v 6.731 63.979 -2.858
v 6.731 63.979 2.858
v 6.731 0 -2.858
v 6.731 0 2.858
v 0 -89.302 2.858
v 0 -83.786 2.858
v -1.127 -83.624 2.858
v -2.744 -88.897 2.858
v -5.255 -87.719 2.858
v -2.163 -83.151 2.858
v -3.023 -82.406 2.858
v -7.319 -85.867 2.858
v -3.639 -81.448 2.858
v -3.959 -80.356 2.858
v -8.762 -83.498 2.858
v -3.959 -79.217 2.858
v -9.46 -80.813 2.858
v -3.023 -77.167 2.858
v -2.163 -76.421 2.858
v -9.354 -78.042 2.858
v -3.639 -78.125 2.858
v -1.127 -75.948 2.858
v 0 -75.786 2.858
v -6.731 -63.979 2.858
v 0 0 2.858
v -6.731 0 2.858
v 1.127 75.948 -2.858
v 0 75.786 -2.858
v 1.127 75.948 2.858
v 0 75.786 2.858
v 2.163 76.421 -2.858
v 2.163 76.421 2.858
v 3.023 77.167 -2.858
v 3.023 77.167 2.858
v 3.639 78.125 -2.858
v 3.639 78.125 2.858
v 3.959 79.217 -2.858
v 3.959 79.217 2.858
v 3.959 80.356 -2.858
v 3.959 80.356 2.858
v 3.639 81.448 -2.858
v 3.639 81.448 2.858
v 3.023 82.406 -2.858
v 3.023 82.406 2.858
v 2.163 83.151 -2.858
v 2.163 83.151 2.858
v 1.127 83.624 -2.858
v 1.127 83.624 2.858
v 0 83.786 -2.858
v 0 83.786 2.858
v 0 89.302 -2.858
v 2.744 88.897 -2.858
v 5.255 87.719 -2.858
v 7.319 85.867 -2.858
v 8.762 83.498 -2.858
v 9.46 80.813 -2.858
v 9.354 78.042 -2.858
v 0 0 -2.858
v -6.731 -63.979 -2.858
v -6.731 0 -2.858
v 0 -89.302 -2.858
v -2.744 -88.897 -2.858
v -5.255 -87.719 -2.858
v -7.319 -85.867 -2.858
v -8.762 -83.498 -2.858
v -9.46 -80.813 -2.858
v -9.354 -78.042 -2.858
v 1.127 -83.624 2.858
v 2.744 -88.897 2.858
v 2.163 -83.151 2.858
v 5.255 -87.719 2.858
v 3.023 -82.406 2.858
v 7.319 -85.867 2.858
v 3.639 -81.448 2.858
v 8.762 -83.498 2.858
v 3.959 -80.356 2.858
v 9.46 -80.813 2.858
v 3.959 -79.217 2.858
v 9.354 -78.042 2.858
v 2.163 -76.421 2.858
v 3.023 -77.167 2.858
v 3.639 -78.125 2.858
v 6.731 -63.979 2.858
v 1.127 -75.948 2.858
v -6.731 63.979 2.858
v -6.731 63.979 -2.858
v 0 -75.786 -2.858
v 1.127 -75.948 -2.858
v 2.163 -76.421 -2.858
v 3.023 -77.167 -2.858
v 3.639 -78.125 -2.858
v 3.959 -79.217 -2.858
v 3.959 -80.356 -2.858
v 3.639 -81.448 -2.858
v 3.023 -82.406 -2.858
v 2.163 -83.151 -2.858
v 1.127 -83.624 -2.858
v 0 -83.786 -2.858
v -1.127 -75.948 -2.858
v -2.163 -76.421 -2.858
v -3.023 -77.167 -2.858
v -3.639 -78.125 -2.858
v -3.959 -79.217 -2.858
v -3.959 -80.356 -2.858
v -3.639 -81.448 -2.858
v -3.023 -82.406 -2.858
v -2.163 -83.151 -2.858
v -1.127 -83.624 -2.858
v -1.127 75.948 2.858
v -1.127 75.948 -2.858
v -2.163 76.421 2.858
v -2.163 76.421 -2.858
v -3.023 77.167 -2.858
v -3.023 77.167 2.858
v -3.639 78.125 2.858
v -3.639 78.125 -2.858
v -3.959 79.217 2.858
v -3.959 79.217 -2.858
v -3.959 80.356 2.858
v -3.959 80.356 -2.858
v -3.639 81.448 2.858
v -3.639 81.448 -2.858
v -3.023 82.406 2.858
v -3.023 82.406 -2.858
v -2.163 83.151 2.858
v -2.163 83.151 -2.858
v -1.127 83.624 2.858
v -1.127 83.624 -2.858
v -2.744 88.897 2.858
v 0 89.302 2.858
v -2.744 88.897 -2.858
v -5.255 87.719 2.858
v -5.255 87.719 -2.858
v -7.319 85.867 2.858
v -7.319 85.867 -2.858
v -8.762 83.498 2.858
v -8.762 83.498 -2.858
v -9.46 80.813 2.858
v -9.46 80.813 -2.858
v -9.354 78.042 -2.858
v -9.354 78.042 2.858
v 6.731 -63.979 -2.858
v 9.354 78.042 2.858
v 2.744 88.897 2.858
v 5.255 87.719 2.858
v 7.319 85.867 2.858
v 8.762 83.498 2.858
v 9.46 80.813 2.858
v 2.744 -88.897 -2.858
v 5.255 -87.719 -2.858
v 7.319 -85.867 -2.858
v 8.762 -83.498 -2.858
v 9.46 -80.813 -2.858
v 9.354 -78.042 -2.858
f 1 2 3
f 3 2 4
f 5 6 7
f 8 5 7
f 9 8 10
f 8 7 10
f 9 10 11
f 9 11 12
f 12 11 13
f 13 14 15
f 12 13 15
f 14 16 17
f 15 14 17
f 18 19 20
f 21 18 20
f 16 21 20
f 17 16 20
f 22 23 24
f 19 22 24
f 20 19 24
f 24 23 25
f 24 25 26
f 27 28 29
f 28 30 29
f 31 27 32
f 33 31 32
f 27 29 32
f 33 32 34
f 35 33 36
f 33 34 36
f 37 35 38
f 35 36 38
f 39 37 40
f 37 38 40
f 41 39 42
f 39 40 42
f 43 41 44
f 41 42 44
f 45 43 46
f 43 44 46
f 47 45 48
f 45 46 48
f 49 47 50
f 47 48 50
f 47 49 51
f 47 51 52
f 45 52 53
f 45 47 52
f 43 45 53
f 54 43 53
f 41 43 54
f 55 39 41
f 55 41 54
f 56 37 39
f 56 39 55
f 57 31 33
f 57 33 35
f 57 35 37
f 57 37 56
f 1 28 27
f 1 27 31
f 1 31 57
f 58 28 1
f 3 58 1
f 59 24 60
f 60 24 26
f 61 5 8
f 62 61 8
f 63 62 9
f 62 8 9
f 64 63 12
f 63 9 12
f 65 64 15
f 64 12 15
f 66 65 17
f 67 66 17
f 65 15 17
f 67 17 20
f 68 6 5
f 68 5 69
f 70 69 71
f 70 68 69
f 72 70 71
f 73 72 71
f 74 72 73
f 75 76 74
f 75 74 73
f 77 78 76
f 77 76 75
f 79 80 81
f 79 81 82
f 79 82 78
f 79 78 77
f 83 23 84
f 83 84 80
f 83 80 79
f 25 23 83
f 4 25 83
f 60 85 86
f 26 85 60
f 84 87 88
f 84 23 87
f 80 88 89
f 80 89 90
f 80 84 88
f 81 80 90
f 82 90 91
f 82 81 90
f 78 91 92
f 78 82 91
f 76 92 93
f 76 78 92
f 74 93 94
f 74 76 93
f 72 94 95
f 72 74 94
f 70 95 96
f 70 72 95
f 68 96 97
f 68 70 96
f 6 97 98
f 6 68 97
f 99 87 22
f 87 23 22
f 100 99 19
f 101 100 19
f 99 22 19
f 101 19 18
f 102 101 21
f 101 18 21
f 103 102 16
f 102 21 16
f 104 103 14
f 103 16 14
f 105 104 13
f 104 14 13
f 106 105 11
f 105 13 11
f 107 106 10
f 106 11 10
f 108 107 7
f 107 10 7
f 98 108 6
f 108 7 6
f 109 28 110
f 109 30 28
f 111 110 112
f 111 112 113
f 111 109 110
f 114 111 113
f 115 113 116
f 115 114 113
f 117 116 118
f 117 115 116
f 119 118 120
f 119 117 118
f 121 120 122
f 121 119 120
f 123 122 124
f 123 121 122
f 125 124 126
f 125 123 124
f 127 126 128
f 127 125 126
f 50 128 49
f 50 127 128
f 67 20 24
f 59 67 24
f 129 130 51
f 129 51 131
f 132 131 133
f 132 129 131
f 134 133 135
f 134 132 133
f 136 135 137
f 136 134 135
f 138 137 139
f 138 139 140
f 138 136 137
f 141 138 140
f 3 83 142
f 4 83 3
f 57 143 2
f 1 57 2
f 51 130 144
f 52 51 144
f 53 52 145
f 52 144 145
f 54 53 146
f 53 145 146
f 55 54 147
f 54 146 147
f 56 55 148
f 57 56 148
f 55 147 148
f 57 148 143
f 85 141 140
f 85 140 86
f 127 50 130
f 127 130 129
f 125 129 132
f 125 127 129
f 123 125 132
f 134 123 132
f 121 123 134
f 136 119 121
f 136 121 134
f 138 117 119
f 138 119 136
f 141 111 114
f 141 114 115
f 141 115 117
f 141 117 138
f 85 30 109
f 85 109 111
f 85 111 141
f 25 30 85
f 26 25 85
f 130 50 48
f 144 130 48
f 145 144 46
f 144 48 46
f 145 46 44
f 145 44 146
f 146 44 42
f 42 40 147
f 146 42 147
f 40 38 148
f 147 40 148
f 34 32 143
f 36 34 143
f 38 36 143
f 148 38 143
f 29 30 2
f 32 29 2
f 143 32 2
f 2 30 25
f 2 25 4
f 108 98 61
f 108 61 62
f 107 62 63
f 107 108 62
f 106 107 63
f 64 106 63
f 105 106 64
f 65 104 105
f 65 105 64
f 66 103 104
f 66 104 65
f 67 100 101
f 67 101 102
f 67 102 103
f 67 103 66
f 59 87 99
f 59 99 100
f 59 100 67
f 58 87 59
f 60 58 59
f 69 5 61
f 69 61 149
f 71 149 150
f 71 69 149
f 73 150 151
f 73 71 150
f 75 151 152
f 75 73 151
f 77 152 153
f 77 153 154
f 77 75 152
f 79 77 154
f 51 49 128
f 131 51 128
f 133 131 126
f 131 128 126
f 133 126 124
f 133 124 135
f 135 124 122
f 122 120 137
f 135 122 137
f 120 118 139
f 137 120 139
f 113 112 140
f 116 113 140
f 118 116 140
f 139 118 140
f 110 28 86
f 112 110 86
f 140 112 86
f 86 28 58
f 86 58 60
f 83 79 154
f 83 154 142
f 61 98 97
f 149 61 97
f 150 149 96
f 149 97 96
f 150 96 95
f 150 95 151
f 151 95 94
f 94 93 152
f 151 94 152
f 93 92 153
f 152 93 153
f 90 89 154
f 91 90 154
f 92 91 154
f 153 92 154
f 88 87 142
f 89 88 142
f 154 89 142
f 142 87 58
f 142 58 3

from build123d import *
from build123d import SkipClean  # not in build123d's __all__

# Parameters (mm, degrees)
F1_DEPTH = 2.8575


with BuildPart() as f1:
    # F0 (on Top) → F1 (new body, symmetric)
    with BuildSketch(Plane.XY):
        with BuildLine():
            ThreePointArc((0, -75.7864124179), (4, -79.7864124179), (0, -83.7864124179))
            Line((0, -83.7864124179), (0, -89.3016444676))
            ThreePointArc((0, -89.3016444676), (7.3191604153, -85.8666699597), (9.3539243357, -78.0417805136))
            Line((9.3539243357, -78.0417805136), (6.731, -63.9788508415))
            Line((6.731, -63.9788508415), (6.731, 0))
            Line((6.731, 0), (0, 0))
            Line((0, 0), (0, -75.7864124179))
        make_face()
    extrude(amount=F1_DEPTH, both=True)

    # F2: F1 across plane


with BuildPart() as f1_1:
    add(f1.part, clean=False)
    with SkipClean():  # cleaning this boolean's faces spoils the solid; the shape is the same uncleaned
        add(f1.part.mirror(Plane.YZ), clean=False)

    # F3: F1 across plane


with BuildPart() as f1_2:
    add(f1_1.part, clean=False)
    add(f1_1.part.mirror(Plane.XZ), clean=False)


solid = f1_2.part
